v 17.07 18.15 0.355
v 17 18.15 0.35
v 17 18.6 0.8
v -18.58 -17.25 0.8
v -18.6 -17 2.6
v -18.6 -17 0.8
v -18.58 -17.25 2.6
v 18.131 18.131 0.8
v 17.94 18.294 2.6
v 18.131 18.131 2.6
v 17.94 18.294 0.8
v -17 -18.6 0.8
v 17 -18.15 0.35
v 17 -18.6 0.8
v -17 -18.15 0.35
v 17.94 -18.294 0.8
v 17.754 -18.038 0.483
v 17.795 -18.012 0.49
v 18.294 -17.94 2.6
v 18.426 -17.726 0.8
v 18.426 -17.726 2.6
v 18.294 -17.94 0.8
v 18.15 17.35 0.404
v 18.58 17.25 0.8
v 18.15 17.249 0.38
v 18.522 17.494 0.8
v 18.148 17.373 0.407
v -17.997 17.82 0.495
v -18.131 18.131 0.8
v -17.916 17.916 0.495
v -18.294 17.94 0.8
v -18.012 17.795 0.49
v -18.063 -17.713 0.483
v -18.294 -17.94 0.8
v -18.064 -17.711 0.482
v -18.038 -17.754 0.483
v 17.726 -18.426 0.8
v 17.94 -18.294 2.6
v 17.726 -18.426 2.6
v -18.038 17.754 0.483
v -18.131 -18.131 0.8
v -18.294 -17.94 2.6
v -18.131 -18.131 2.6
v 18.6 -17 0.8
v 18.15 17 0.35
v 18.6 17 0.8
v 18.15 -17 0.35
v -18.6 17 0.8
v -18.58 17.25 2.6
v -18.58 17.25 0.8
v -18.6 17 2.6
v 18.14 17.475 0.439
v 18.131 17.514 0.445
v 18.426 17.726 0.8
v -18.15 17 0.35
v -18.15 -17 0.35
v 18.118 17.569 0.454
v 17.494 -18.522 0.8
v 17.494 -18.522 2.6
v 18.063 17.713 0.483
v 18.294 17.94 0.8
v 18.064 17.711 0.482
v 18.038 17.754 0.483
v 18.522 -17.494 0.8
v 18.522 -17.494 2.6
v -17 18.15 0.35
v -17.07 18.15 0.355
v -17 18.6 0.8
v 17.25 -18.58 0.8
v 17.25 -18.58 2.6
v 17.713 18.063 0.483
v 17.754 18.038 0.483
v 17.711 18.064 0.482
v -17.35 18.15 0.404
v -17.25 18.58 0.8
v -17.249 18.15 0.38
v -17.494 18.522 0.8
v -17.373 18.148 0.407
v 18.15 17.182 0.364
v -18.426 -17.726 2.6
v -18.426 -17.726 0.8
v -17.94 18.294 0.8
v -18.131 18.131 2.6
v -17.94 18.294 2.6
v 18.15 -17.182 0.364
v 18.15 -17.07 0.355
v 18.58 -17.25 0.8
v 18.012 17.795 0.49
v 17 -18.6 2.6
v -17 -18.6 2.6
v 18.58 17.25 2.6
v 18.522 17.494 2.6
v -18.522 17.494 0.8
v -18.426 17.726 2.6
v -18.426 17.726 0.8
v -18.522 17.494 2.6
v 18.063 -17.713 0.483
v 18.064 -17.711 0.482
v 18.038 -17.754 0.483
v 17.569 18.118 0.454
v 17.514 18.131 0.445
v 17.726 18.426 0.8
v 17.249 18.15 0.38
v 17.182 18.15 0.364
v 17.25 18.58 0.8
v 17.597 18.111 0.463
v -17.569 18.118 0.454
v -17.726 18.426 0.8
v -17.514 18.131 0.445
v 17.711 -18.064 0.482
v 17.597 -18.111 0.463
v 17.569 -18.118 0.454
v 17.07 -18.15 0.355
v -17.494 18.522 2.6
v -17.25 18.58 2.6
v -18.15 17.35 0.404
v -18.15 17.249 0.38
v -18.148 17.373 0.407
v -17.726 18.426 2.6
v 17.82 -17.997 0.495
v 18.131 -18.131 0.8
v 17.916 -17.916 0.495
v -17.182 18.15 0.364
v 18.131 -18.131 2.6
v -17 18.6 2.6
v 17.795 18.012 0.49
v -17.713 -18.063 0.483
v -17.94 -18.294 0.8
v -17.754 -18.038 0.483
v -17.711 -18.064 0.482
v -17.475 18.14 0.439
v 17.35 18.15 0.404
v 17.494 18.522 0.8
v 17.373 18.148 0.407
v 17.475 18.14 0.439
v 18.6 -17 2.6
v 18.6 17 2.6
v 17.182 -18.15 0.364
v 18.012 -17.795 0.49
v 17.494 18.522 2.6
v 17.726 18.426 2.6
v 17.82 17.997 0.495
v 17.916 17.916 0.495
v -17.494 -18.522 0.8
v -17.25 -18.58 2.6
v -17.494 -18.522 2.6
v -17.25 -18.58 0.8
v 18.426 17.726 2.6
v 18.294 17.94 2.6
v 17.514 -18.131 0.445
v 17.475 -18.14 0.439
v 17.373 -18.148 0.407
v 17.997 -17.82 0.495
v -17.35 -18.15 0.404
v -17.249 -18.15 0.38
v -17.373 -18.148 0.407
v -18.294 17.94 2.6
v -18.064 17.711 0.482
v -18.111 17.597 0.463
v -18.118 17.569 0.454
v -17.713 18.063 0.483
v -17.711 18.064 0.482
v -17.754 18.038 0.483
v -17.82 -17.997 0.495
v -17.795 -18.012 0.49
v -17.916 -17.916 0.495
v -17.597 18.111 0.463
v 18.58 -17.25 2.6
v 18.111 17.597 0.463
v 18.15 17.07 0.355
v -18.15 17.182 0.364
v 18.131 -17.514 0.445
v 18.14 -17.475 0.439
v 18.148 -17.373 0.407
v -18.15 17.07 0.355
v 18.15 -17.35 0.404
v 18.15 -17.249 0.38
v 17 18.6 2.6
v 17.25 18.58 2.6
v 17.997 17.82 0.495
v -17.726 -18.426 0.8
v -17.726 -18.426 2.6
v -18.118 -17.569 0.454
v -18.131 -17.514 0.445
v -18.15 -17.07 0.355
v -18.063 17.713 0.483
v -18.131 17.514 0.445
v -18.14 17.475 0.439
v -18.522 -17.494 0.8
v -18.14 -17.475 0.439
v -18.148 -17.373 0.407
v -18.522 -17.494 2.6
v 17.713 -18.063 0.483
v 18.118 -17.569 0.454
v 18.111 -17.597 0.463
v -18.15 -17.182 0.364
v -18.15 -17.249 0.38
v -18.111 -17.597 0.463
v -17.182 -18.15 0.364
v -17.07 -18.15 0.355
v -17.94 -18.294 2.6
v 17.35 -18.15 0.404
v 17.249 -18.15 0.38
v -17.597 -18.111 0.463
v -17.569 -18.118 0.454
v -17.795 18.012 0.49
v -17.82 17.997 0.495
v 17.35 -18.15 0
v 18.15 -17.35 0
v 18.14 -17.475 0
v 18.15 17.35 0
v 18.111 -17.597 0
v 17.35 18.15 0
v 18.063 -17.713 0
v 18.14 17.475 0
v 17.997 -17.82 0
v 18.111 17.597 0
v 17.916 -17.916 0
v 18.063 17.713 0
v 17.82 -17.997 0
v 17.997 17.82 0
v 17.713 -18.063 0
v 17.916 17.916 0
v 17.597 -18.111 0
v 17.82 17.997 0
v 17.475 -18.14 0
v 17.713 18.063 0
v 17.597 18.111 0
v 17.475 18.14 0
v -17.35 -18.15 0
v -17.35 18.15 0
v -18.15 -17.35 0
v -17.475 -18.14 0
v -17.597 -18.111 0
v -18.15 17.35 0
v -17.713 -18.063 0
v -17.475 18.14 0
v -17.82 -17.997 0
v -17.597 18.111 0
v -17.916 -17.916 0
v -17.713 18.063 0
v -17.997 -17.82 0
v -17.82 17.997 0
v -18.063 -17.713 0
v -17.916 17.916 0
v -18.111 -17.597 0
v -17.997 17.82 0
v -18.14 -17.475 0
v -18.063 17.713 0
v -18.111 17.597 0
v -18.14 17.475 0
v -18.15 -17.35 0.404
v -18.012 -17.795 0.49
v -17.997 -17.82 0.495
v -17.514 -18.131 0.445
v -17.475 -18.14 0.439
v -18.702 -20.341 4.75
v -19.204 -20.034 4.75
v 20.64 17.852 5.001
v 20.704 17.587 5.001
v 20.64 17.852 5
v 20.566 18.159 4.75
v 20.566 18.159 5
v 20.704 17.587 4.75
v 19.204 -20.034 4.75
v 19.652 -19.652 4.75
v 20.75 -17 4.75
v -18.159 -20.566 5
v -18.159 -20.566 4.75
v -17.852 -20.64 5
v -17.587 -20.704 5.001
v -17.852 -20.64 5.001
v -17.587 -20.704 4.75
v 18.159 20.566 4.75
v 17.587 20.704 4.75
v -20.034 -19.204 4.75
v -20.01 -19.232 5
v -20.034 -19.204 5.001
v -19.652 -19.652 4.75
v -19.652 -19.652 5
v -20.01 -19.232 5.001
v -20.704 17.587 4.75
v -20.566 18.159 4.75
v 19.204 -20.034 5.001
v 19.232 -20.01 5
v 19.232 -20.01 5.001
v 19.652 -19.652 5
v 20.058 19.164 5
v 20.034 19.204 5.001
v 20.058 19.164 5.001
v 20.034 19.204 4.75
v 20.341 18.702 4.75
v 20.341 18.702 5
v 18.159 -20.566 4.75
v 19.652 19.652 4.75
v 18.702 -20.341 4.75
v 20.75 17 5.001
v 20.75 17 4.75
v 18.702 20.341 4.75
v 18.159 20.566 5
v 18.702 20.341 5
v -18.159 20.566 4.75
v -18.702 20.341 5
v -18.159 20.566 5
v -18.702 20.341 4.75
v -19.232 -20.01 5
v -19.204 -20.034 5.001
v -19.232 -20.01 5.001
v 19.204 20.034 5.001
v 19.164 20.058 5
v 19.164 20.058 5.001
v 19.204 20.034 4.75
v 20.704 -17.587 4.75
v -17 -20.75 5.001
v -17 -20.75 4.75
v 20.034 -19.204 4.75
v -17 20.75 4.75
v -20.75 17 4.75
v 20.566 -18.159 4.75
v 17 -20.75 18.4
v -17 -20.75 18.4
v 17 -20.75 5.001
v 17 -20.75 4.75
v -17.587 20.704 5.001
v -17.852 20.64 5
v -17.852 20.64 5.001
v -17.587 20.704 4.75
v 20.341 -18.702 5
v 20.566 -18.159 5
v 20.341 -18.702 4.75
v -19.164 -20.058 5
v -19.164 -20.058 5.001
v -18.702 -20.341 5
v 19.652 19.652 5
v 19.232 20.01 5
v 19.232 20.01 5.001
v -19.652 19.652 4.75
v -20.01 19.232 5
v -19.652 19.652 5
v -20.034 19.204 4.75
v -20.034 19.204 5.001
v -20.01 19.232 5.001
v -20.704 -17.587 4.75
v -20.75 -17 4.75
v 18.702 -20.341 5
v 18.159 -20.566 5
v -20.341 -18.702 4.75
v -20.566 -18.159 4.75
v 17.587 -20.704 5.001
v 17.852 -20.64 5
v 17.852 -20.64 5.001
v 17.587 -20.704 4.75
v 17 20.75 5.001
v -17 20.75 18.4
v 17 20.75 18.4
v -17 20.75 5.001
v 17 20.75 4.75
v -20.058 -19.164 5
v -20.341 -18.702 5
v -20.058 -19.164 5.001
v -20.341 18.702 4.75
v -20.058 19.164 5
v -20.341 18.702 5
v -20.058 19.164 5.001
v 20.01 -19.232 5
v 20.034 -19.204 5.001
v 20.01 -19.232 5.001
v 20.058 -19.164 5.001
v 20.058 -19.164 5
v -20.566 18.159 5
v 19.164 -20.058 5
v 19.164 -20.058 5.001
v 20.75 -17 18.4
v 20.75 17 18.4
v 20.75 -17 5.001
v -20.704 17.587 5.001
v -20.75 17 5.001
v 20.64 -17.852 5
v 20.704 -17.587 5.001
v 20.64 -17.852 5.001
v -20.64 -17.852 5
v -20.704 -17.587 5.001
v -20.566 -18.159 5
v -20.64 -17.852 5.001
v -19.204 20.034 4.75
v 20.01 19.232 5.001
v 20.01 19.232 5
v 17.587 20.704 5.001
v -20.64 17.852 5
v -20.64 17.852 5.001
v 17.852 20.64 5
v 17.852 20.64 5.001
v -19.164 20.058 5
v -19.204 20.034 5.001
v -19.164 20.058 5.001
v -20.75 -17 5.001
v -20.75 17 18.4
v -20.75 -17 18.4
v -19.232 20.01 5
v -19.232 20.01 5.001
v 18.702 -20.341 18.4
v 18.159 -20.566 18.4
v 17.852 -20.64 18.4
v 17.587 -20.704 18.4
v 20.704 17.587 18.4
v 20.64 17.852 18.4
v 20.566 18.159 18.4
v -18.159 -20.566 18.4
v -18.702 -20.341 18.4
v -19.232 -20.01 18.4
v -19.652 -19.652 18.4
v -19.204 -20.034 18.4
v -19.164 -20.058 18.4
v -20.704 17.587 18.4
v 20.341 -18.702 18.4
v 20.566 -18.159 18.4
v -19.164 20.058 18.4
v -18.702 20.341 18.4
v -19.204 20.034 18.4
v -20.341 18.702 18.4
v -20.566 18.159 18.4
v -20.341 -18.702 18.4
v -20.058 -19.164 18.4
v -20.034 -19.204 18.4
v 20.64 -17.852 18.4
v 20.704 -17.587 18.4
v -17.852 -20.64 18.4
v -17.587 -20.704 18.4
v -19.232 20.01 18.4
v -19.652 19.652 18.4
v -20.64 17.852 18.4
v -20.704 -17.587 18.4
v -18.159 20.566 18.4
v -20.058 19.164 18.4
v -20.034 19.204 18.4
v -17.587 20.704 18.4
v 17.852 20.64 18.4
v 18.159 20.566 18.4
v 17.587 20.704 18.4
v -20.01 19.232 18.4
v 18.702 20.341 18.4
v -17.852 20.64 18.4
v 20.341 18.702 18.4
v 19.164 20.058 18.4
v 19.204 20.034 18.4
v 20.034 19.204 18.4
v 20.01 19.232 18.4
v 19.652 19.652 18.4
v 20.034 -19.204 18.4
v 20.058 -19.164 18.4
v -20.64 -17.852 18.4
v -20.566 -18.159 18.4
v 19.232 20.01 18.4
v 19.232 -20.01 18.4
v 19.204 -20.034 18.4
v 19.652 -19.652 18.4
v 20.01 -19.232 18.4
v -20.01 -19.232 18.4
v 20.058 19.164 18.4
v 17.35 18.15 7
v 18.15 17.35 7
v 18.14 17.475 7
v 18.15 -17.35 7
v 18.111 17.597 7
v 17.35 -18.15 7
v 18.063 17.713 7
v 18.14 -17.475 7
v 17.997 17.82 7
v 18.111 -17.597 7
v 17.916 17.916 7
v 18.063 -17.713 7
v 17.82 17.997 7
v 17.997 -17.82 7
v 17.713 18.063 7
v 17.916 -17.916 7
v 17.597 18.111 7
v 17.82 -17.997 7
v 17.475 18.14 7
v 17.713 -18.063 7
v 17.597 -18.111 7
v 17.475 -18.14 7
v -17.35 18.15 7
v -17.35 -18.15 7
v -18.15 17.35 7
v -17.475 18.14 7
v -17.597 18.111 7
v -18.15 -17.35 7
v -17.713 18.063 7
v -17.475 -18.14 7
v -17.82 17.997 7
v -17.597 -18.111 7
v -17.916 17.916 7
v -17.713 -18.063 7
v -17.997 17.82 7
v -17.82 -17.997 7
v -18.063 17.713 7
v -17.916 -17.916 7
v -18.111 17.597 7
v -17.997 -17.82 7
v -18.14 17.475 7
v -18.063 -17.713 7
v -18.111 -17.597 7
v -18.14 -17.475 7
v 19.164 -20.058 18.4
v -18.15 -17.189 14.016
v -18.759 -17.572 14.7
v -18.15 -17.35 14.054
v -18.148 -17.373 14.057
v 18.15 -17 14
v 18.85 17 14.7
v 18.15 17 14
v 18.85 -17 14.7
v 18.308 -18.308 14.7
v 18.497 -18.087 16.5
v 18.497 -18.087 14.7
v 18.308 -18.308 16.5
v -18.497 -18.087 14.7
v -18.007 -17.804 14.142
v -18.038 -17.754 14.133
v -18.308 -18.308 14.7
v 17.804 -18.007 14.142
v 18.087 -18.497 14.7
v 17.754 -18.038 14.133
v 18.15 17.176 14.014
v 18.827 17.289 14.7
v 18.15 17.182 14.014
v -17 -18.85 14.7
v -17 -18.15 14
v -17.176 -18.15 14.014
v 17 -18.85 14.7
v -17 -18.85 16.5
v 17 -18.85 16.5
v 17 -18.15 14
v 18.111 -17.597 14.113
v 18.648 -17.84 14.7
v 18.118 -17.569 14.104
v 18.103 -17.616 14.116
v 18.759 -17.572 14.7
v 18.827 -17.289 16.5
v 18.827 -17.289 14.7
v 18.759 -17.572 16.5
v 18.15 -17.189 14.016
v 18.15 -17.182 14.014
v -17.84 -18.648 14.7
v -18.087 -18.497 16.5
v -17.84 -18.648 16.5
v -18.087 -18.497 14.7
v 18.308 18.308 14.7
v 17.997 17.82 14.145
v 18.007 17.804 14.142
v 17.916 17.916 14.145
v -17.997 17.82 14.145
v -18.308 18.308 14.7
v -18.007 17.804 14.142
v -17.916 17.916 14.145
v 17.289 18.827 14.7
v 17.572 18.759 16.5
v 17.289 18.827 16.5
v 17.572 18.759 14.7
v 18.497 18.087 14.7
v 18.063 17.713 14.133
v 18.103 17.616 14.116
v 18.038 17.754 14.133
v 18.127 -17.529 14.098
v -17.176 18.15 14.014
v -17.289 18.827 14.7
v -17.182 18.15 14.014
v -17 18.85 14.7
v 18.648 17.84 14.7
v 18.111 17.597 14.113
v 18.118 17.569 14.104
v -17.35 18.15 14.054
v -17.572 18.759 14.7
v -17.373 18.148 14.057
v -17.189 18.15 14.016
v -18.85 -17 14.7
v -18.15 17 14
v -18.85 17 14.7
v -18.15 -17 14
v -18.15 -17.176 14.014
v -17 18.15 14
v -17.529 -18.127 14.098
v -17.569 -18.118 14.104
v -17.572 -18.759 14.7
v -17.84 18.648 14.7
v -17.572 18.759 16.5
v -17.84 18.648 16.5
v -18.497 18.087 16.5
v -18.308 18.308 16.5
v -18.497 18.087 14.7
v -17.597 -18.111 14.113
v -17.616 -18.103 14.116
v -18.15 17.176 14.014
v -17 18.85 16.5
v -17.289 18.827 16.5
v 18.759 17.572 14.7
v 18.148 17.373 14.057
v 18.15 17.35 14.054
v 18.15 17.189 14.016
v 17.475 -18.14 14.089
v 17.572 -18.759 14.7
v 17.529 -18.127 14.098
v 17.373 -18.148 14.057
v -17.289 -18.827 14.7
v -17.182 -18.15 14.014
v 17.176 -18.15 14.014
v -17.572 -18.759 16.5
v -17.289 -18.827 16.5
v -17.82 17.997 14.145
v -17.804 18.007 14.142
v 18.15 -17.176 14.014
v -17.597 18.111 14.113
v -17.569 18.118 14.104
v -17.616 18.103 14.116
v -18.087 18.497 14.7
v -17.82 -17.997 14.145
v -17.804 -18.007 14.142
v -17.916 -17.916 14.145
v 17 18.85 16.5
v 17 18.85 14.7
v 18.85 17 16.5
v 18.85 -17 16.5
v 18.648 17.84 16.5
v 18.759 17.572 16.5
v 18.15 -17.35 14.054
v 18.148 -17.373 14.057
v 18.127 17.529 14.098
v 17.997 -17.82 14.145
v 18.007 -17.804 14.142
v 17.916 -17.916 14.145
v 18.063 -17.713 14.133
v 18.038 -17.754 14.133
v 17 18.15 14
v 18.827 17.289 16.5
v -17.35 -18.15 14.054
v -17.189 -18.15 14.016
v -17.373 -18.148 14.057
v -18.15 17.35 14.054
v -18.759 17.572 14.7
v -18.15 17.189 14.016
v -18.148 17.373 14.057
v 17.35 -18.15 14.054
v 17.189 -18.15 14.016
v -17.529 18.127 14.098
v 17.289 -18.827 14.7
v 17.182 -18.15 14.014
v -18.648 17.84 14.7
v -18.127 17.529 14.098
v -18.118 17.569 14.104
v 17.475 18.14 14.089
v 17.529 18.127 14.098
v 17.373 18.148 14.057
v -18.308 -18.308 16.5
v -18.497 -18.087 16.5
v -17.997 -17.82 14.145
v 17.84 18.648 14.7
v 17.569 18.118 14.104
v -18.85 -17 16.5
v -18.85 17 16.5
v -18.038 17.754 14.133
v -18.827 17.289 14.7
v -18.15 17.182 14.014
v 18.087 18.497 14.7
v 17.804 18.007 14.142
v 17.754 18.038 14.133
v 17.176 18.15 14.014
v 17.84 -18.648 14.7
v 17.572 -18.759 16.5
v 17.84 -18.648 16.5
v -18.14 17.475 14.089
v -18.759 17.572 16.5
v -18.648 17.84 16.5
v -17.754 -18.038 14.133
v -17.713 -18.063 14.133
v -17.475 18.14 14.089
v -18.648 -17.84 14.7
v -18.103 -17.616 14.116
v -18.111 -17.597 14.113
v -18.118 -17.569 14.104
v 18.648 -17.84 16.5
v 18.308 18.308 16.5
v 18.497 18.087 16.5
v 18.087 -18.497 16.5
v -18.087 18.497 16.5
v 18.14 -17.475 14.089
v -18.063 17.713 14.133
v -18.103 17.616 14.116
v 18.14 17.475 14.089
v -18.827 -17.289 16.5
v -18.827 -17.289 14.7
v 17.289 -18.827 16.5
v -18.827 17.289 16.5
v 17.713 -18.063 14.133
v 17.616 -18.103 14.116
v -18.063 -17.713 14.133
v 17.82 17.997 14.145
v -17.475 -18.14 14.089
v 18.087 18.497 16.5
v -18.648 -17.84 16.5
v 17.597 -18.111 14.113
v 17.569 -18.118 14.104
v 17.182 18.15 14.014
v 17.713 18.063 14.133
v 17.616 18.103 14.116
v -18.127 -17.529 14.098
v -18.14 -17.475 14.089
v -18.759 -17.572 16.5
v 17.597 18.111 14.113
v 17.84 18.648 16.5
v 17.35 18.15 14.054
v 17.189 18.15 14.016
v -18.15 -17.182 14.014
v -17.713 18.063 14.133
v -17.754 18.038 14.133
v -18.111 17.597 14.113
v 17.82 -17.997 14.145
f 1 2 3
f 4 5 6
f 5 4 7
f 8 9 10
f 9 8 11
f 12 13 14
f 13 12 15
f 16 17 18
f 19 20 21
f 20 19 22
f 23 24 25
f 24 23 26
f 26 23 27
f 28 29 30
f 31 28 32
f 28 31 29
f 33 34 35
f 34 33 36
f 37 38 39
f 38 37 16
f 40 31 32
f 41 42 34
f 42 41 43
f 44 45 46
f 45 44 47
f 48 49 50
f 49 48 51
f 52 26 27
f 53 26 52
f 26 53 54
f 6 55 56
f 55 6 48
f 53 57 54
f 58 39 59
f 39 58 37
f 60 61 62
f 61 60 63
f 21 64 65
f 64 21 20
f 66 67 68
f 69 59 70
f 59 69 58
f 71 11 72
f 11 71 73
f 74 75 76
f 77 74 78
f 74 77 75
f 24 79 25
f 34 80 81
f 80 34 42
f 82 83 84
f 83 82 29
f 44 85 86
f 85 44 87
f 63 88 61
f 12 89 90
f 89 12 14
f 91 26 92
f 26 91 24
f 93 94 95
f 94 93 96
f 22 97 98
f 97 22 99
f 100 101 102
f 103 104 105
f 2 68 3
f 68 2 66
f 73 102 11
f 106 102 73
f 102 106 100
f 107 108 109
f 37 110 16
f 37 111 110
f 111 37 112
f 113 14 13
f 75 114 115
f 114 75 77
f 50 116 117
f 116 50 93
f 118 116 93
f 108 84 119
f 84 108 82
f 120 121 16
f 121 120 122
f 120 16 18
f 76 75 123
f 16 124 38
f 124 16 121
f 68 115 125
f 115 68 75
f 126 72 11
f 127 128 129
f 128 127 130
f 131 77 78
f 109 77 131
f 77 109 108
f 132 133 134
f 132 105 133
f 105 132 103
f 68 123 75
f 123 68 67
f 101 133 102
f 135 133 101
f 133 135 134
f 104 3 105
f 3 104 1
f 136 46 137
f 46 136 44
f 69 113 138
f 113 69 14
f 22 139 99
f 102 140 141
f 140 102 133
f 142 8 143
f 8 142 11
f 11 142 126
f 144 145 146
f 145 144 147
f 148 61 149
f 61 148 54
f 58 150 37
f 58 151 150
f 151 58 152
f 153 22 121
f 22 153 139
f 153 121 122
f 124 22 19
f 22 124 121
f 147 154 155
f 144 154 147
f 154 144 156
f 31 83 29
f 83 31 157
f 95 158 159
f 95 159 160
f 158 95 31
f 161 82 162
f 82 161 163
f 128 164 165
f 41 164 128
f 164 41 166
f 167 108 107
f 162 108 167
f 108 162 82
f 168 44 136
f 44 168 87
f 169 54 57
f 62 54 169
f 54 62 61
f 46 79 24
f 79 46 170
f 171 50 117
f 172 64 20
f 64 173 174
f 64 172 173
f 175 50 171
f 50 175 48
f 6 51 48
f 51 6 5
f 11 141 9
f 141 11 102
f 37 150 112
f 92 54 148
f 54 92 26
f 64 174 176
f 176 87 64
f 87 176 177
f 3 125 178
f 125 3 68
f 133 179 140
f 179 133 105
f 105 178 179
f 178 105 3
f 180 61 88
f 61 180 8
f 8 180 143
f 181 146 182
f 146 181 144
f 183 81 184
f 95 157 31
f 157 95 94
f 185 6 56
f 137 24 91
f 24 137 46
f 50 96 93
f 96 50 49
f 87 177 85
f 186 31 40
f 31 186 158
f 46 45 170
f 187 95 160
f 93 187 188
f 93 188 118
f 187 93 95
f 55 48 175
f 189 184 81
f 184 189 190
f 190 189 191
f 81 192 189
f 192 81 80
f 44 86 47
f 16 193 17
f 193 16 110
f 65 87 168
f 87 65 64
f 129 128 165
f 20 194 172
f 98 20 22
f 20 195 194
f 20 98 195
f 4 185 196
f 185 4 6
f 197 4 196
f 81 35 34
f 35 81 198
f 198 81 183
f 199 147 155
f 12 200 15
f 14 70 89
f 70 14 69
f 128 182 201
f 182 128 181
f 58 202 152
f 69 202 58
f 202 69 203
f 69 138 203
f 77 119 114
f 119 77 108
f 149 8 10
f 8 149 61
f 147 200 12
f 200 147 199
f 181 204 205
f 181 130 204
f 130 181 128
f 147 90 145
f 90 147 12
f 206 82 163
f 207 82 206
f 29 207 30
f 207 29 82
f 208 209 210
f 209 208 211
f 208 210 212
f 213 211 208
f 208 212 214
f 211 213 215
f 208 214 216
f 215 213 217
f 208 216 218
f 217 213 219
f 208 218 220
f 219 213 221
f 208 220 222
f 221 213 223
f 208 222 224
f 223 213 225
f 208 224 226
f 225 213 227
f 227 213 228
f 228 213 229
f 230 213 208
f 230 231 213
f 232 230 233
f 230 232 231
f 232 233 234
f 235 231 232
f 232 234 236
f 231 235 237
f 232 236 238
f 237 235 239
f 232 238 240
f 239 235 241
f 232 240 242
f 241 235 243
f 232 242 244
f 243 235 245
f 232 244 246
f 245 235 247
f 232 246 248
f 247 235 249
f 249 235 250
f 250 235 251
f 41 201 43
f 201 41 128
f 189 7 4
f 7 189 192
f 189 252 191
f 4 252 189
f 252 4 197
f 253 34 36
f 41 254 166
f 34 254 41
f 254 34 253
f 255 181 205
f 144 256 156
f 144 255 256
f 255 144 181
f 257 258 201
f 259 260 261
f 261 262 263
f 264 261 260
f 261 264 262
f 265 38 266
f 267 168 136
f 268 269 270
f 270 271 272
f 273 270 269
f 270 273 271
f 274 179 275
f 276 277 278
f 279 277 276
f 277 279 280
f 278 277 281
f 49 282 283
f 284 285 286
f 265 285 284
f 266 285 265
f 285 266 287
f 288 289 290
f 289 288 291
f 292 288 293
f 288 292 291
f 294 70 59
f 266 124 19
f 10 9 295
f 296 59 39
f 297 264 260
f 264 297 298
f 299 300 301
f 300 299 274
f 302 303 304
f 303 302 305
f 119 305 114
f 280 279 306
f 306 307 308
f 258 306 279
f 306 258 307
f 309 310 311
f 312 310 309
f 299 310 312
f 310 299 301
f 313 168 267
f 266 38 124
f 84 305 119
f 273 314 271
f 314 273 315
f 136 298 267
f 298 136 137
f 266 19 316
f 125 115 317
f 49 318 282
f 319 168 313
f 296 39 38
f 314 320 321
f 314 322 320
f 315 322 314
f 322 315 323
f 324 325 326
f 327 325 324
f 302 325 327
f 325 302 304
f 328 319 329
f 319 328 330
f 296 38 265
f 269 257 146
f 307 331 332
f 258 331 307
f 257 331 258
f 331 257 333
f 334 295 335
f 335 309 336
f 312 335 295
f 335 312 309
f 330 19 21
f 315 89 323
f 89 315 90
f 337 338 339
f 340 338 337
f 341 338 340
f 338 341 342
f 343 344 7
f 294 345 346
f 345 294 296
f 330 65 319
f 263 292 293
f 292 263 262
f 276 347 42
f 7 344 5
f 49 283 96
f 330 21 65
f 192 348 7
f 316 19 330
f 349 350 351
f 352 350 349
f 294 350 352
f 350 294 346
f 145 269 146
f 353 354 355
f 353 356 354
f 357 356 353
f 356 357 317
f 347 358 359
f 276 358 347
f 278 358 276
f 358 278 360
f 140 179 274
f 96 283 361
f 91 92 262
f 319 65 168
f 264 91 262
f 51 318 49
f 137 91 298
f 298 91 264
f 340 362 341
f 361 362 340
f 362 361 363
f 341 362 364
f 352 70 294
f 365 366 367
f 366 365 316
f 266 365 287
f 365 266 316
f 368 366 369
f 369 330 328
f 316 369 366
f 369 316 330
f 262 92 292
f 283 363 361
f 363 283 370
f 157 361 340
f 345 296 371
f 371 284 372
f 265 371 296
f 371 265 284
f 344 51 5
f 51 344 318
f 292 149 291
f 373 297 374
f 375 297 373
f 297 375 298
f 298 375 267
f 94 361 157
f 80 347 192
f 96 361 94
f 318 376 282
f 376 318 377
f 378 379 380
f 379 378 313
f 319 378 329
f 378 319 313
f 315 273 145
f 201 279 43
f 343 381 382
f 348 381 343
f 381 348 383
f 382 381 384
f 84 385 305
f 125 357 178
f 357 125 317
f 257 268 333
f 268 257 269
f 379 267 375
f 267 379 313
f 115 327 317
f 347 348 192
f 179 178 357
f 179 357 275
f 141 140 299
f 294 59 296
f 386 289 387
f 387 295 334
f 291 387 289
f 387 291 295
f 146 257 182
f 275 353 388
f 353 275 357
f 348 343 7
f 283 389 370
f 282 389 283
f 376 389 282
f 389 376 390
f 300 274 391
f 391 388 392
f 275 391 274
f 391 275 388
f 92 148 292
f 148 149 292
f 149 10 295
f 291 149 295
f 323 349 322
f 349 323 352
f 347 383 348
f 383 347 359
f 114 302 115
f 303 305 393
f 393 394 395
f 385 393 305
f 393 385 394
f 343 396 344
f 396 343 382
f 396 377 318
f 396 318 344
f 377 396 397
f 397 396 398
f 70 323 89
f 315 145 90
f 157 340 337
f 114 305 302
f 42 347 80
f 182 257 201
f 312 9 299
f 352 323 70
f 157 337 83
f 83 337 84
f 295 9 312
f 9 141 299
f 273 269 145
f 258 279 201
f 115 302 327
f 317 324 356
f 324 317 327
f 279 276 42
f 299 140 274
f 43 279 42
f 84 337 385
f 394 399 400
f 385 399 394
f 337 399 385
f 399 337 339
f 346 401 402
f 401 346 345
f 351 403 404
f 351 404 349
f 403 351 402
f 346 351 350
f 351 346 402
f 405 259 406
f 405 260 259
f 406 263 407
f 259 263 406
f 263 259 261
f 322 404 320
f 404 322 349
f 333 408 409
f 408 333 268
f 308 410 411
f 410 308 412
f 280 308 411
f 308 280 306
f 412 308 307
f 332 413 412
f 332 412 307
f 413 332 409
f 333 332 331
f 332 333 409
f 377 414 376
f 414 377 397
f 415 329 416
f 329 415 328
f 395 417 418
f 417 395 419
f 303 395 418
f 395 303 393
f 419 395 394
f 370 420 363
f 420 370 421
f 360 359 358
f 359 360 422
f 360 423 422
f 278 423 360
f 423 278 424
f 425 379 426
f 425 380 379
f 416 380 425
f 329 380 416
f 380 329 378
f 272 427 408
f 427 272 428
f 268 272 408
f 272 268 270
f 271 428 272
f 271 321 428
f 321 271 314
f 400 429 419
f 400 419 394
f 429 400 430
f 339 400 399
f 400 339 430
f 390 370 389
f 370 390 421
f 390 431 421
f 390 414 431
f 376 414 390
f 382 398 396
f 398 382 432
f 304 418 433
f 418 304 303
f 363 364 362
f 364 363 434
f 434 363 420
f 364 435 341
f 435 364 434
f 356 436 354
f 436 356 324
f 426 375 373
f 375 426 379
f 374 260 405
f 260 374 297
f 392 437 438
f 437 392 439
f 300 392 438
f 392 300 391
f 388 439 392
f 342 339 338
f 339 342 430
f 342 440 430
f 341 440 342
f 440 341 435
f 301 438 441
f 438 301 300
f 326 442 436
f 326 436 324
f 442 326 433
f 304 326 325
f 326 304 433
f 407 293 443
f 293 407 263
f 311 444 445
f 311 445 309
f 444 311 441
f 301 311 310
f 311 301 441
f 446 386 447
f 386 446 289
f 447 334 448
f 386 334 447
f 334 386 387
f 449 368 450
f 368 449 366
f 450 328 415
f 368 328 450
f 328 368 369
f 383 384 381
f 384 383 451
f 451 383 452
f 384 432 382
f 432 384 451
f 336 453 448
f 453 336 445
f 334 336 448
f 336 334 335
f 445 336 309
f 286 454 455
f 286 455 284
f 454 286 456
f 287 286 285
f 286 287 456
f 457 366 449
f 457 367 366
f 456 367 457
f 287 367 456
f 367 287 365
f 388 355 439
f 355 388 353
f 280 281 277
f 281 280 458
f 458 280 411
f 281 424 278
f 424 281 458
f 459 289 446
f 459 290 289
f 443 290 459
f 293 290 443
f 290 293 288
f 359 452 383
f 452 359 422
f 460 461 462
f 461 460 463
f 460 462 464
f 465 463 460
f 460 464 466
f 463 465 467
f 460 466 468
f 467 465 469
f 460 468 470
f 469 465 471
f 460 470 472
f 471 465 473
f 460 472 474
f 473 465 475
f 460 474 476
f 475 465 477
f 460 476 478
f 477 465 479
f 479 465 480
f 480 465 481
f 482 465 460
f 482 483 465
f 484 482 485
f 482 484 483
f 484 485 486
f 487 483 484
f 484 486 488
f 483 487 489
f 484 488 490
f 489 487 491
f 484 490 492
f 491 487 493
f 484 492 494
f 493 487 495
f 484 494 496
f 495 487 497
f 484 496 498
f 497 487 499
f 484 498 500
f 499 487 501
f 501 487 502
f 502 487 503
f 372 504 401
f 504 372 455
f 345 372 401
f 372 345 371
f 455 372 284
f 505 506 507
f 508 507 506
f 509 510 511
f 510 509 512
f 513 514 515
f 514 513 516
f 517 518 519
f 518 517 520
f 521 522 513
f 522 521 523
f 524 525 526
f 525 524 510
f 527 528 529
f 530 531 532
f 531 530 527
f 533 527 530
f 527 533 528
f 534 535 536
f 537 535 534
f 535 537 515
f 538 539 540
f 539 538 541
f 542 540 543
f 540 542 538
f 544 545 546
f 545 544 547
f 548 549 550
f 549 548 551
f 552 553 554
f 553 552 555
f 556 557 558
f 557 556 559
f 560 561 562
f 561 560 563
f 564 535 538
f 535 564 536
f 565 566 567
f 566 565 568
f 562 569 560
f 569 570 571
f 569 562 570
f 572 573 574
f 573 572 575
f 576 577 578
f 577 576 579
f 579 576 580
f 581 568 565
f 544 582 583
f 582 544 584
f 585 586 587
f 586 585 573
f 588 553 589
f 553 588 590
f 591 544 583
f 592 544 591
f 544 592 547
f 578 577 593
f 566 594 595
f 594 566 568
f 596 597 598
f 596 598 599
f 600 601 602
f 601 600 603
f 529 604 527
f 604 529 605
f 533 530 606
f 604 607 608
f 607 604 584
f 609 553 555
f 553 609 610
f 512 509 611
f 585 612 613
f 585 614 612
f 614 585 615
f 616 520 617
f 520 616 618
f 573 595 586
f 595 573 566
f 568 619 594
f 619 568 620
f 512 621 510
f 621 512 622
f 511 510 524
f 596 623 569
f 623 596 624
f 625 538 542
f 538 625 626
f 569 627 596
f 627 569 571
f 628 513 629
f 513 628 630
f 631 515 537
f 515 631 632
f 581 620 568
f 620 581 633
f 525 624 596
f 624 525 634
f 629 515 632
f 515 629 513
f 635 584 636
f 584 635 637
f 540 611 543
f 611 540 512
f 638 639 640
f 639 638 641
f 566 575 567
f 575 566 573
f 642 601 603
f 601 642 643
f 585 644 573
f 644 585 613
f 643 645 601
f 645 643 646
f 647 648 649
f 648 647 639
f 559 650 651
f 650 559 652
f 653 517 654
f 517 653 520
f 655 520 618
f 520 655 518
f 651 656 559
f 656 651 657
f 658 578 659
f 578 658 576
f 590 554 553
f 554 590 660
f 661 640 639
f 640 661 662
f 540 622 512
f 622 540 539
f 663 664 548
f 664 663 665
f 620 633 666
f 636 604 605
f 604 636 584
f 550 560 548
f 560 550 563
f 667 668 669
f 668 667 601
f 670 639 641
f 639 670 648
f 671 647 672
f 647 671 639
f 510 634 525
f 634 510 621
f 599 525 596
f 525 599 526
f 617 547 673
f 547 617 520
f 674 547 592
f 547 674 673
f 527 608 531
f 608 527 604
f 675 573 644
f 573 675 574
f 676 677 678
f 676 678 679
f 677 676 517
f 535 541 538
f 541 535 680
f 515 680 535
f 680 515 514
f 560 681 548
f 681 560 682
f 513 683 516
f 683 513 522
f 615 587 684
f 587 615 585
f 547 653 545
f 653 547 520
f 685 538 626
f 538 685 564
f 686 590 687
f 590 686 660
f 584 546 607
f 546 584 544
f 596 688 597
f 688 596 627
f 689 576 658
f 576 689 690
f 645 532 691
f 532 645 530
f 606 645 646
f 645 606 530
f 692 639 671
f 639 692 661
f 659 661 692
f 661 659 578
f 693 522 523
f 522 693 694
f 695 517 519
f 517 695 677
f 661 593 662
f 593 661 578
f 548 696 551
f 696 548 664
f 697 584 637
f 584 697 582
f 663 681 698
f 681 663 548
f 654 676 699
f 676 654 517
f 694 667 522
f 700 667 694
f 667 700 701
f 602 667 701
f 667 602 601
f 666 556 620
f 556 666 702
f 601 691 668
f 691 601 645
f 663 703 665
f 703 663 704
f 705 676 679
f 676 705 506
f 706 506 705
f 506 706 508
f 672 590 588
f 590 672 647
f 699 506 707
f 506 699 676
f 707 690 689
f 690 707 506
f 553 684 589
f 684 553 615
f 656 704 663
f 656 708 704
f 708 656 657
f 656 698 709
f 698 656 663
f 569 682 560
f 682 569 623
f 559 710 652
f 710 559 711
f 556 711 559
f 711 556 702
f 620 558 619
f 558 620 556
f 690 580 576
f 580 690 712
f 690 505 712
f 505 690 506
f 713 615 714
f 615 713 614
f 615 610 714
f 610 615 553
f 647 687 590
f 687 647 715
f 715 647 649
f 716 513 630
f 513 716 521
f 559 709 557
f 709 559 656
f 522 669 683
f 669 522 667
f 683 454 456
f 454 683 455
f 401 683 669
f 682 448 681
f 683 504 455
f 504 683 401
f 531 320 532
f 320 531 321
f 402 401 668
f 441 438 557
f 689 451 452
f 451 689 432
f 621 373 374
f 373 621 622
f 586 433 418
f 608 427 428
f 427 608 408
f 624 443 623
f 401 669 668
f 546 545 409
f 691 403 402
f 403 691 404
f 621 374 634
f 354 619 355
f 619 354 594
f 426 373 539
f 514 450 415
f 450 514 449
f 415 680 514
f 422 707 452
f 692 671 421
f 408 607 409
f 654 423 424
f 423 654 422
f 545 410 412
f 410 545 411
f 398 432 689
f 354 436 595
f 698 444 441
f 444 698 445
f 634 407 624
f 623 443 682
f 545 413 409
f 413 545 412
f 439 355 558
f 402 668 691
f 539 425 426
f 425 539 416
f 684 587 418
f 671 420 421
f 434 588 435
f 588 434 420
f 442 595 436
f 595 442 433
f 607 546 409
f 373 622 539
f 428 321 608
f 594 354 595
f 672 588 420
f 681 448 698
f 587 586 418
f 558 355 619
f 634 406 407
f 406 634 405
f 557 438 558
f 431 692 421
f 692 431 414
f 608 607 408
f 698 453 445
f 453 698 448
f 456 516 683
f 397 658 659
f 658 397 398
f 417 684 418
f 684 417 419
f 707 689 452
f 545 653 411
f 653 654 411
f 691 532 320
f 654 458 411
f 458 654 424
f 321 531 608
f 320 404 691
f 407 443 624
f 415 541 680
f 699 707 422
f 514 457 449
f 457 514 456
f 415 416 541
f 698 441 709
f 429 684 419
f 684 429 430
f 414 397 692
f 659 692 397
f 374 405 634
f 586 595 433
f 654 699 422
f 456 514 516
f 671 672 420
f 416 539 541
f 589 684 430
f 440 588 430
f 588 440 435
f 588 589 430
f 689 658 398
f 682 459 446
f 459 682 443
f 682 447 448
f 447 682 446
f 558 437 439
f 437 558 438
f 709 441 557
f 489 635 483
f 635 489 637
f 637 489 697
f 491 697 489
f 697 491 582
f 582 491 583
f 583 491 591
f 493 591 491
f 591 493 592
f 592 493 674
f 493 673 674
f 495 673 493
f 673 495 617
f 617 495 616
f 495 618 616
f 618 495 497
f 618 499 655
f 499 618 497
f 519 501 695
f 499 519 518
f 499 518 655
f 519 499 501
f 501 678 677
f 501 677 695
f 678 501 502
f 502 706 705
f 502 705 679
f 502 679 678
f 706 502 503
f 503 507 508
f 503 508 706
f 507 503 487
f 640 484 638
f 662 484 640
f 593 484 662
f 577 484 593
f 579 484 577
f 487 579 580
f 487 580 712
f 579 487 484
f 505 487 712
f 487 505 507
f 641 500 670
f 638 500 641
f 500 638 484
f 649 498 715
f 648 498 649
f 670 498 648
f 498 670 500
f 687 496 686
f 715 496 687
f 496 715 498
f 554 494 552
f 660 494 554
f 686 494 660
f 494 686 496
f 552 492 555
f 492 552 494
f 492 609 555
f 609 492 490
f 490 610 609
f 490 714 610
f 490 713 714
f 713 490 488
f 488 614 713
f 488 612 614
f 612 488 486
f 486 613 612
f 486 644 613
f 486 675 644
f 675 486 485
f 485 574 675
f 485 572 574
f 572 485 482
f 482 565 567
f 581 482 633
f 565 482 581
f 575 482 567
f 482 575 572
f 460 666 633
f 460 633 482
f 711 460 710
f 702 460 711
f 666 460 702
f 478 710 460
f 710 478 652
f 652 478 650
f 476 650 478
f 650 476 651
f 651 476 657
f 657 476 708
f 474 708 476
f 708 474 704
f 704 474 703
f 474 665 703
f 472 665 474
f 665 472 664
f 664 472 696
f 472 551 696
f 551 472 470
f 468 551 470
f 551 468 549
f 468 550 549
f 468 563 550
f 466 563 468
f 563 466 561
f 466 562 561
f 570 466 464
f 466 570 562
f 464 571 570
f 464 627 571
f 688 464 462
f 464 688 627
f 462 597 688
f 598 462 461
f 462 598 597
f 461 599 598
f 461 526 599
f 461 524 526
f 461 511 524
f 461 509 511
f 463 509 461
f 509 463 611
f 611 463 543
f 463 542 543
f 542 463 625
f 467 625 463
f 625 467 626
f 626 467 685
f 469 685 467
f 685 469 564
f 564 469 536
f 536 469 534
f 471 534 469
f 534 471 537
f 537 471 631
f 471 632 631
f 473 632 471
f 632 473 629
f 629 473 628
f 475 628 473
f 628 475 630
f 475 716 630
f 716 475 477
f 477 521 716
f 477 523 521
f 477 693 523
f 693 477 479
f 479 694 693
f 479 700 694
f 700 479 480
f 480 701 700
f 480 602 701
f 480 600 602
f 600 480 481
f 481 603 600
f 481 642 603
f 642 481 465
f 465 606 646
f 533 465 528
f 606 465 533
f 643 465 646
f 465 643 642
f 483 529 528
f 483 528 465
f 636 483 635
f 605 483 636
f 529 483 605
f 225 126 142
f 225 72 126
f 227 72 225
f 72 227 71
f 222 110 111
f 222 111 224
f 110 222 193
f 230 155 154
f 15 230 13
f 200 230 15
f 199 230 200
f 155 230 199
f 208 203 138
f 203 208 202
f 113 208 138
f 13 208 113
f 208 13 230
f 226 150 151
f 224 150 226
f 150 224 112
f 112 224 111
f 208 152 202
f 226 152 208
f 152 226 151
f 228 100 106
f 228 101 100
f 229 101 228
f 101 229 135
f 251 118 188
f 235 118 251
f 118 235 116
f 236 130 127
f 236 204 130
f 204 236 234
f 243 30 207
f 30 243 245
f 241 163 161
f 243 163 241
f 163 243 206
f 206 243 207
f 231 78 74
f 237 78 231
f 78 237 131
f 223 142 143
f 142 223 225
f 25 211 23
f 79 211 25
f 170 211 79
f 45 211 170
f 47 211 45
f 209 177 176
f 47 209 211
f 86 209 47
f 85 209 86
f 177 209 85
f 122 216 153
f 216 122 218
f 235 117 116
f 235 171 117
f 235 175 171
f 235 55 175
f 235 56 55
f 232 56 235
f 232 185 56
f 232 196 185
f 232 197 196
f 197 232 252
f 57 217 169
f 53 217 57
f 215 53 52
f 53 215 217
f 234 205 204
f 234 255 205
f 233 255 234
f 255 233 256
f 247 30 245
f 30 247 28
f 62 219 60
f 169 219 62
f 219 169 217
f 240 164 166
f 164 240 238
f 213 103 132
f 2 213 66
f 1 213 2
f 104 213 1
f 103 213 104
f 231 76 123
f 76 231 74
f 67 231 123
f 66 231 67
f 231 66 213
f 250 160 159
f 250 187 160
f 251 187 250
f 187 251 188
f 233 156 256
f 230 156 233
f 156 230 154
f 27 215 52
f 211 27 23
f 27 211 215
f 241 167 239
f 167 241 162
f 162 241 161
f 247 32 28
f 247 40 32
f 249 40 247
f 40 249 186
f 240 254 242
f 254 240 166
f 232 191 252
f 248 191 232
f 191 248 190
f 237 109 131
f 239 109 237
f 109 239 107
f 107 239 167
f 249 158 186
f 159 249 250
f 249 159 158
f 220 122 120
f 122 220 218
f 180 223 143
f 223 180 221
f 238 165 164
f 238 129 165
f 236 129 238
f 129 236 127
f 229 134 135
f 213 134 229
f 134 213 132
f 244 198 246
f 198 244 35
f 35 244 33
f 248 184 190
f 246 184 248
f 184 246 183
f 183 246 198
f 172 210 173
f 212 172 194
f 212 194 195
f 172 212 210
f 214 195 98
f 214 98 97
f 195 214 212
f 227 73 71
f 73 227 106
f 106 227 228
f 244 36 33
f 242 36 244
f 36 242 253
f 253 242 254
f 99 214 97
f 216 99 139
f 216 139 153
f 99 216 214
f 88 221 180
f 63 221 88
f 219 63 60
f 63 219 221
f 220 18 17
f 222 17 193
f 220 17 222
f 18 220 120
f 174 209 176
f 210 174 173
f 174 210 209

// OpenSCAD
// file: gridfinity_boxes.scad
// Gridfinity Module Generator
// Copyright 2023 Chris Cogdon
// Licence: CC-BY-SA-3.0
// https://www.github.com/chmarr/gridfinity-boxes

$fn=40;
epsilon = 0.001; // a small value to make difference() look nice.

// Constants derived from spec sheet
module_side=41.5;
module_radius_1=3.75;  // because using diameters for fillets is non-standard.
module_radius_2=1.6;
module_radius_3=0.8;
module_base_height=5;
module_spacing=42;
module_unit_height=7;
module_internal_square = module_side - 2*module_radius_1;
internals_radius = module_radius_3;
internals_side=module_side - 2*(1.9 + 0.7);

function coalesce(a, b) = a == undef ? b : a;
function module_dim(count) = [module_side+(count.x-1)*module_spacing, module_side + (count.y-1) * module_spacing];
function internals_dim(count) = [internals_side+(count.x-1)*module_spacing, internals_side+(count.y-1)*module_spacing];
function module_internal_dim(count) = [module_internal_square+(count.x-1)*module_spacing, module_internal_square+(count.y-1)*module_spacing];
function add_point_and_number(dim, addition) = [dim.x+addition, dim.y+addition];

module rounded_wedge(size, radius1, radius2, external=false){
    radius2_ = radius2 == undef ? radius1 : radius2;
    x = external ? size.x : size.x - radius1;
    y = external ? size.y : size.y - radius1;
    minkowski(){
        cube([x, y, epsilon]);
        cylinder(r1=radius1, r2=radius2_, h=size.z);
    }  
}

module isolated_fillet(radius, length) {
    difference() {
        cube([radius, radius, length]);
        translate([radius, radius, -epsilon])
            cylinder(r=radius, h=length + 2*epsilon);
    }
}

module gridfinity_insert () {
    // Constants derived from spec sheet.
    height_0 = module_radius_2-module_radius_3; // heights also become radii as angles are 45deg.
    height_1 = 1.8;
    height_2 = module_radius_1-module_radius_2;
    // This part should not be necessary, but included to add tolerance to
    // the peak of the gridfinity base.
    height_3 = module_base_height - height_0 - height_1 - height_2;
    translate([-module_internal_square/2, -module_internal_square/2]) {
        translate([0, 0, 0])
        rounded_wedge([module_internal_square, module_internal_square, height_0], height_0, 2*height_0, external=true);
        translate([0, 0, height_0])
            rounded_wedge([module_internal_square, module_internal_square, height_1], 2*height_0, external=true);
        translate([0, 0, height_0+height_1])
            rounded_wedge([module_internal_square, module_internal_square, height_2], 2*height_0, 2*height_0 + height_2, external=true);
        translate([0, 0, height_0+height_1+height_2])
            rounded_wedge([module_internal_square, module_internal_square, height_3], 2*height_0 + height_2, external=true);
    }
}

module gridfinity_module_outline(count) {
    translate([-module_side/2 + module_radius_1, -module_side/2 + module_radius_1])
        offset(r=module_radius_1)
        square([module_side + (count.x-1) * module_spacing - 2*module_radius_1,
            module_side + (count.y-1) * module_spacing - 2*module_radius_1]);
}

module gridfinity_module_mass(count, height, z_offset=module_unit_height) {
    // Height and z_offset should typically be a multiple of 7.
    translate([0,0, z_offset])
        linear_extrude(height=height)
        gridfinity_module_outline(count);
}

module gridfinity_internals_outline(count){
    translate([-internals_side/2 + internals_radius, -internals_side/2 + internals_radius])
        offset(r=internals_radius)
        square(add_point_and_number(internals_dim(count), -2*internals_radius));
}

module gridfinity_internals_mass(count, height, z_offset=module_unit_height, radius=0) {
    translate([0, 0, z_offset])
        linear_extrude(height=height)
            gridfinity_internals_outline(count);
    internals = internals_dim(count);
    if ( radius > 0 ) {
        // x=0 side
        translate([-internals_side/2, internals.y - internals_side/2, height + z_offset])
            rotate([90, 0, 0])
            isolated_fillet(radius, internals.y);
        // x=N side
        translate([internals.x - internals_side/2, -internals_side/2, height + z_offset])
            rotate([90,0,180])
            isolated_fillet(radius, internals.y);
        // y=0 side
        translate([-internals_side/2, -internals_side/2, height + z_offset])
            rotate([90,0,90])
            isolated_fillet(radius, internals.x);
        // y=N side
        translate([internals.x - internals_side/2, internals.y - internals_side/2, height + z_offset])
            rotate([90,0,-90])
            isolated_fillet(radius, internals.x);
    }
}

module gridfinity_wall_outline(count) {
    difference(){
        gridfinity_module_outline(count);
        gridfinity_internals_outline(count);
    }
}

module gridfinity_wall(count, height, z_offset=module_unit_height) {
    // Height and z_offset should be multiple of 7.
    translate([0, 0, z_offset])
        linear_extrude(height=height)
        gridfinity_wall_outline(count);
}

module gridfinity_module_base(count) {
    plane_height = module_unit_height - module_base_height;
    for(x=[0:count.x-1]) {
        for(y=[0:count.y-1]) {
            translate([x * module_spacing, y*module_spacing])
                gridfinity_insert();
        }
    }
    gridfinity_module_mass(count, plane_height, module_base_height);
}

module gridfinity_stacking_lip(count, z_offset) {
    // Constants derived from spec sheet
    height_3 = 1.9;
    radius_3 = module_radius_1;
    height_2 = 1.8;
    radius_2 = radius_3 - height_3;
    height_1 = 0.7;
    radius_1 = radius_2;
    radius_0 = radius_1 - height_1;
    base = module_internal_dim(count);
    stacking_lip_height = height_1 + height_2 + height_3; // 4.4mm
    translate([0,0,z_offset])
    difference () {
        linear_extrude(height=stacking_lip_height)
            gridfinity_wall_outline(count);
        translate([-module_internal_square/2, -module_internal_square/2]) {
            rounded_wedge([base.x, base.y, height_1], radius_0, radius_1, external=true);
            translate([0, 0, height_1])
                rounded_wedge([base.x, base.y, height_2], radius_1, radius_2, external=true);
            translate([0, 0, height_1 + height_2])
                rounded_wedge([base.x, base.y, height_3], radius_2, radius_3, external=true);
        }
    }
}


count=[1,1];
gridfinity_module_base(count);
gridfinity_wall(count, 7);
gridfinity_internals_mass(count,0, radius=5);
gridfinity_stacking_lip(count,14);
// main file
// Gridfinity Module Generator
// Copyright 2023 Chris Cogdon
// Licence: CC-BY-SA-3.0
// https://www.github.com/chmarr/gridfinity-boxes

// This example creates a simple gridfinity 1x1 box, 14mm (2U) high, plus the 4.4mm stacking lip.

$fn = 60;
use <gridfinity_boxes.scad>

count=[1,1]; // Gridfinity 1x1

gridfinity_module_base(count); // Add in the base
gridfinity_wall(count, 7); // Add in the side walls. Height is in addition to the 7mm base
// gridfinity_internal_mass(count, 7) // Not utilizing this feature in this example
gridfinity_internals_mass(count, 4, [1,1,1,1]); // Add fillets on all sides
gridfinity_stacking_lip(count, z_offset=14); // Add in the stacking lip. Note that z_offset includes wall
                                             // and module base.
